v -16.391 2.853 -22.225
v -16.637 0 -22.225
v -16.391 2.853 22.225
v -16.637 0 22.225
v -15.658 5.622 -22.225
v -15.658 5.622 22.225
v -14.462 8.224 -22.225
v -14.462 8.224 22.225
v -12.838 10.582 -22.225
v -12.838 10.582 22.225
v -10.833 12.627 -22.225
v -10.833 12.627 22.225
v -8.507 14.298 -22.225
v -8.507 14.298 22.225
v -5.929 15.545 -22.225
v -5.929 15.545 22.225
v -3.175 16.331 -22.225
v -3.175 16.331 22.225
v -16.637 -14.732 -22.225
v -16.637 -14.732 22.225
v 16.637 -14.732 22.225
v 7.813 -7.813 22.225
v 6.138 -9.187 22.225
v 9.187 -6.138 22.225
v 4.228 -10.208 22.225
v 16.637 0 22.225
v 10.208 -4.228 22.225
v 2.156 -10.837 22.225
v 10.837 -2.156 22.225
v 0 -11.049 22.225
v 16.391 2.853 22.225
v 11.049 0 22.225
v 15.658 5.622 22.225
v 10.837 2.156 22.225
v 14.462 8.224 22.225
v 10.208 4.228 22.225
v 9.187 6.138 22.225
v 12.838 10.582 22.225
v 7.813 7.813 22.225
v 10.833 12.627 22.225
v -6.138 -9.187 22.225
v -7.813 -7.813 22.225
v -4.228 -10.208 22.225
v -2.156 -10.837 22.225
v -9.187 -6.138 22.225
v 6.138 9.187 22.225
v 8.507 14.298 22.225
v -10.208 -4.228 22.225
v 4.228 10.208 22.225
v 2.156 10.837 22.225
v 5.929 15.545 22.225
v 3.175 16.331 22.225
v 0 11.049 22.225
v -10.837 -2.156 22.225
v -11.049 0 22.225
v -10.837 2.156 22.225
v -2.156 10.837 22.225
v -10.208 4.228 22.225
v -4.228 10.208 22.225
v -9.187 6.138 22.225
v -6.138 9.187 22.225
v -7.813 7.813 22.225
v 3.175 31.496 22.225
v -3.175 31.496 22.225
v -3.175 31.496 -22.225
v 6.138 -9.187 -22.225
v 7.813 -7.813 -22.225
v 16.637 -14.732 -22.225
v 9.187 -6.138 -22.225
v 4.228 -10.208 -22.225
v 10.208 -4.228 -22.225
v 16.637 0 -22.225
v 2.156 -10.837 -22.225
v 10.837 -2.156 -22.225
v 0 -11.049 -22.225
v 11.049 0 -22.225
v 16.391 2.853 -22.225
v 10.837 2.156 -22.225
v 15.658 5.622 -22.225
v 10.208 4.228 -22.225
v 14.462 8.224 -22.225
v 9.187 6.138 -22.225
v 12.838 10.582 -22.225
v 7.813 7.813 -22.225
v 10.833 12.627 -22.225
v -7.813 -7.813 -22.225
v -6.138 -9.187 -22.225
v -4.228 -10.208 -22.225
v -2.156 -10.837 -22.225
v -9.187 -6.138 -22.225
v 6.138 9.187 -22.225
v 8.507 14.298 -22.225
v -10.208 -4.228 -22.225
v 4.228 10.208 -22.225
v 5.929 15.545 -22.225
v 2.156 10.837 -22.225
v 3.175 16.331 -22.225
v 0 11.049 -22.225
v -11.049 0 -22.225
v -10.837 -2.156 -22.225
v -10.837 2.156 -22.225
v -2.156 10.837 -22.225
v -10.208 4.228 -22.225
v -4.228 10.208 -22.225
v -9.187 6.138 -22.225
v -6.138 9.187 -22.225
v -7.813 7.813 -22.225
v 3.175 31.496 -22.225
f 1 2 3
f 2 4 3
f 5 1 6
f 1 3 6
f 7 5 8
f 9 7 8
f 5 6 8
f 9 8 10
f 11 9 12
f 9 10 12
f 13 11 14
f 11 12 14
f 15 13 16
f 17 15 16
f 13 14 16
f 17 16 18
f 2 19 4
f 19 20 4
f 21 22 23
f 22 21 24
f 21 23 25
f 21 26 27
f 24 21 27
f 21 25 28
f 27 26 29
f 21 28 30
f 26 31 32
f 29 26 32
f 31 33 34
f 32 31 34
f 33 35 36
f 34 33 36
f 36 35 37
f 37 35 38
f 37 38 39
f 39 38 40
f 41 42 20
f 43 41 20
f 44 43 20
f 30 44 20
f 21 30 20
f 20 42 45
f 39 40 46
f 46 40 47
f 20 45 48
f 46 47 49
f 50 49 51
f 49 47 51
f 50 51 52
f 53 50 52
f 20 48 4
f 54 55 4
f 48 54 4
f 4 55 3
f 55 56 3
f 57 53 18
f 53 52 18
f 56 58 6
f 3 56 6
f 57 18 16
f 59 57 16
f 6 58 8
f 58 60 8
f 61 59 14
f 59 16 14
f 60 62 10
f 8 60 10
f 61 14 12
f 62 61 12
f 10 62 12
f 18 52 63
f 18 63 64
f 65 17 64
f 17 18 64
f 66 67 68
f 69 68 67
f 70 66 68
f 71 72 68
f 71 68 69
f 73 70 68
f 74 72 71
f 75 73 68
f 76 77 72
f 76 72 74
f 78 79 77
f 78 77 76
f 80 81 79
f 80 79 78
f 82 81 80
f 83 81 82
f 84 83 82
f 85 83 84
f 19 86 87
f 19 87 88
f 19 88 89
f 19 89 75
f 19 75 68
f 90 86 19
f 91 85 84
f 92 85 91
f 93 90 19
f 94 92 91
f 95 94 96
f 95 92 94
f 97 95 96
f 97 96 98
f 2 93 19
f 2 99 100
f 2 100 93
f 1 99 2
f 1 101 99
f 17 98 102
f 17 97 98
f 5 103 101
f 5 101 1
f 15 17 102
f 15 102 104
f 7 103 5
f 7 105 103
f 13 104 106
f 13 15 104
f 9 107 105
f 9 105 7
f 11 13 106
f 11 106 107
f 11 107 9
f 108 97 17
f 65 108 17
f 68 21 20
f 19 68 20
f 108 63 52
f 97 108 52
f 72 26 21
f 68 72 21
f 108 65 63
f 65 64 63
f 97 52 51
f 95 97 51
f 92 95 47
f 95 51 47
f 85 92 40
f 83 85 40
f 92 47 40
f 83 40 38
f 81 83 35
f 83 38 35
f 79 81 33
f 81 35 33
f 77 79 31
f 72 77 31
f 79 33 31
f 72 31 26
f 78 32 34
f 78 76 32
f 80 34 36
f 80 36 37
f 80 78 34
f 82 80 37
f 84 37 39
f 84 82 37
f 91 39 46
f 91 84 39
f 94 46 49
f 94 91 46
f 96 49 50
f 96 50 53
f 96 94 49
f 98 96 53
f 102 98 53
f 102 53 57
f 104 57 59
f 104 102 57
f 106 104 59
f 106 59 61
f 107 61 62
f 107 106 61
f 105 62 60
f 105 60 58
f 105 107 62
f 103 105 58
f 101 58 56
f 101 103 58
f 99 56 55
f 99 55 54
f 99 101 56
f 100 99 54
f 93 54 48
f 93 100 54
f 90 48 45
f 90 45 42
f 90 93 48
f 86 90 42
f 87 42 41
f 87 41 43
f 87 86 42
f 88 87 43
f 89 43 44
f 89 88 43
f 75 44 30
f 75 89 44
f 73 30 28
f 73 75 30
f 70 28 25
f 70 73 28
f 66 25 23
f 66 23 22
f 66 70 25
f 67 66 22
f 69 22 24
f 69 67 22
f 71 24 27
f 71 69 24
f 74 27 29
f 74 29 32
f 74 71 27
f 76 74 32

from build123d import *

# Parameters (mm, degrees)
SKETCH1_R           = 11.049
BOSS_EXTRUDE1_DEPTH = 22.225


with BuildPart() as part:
    # Sketch1 → Boss-Extrude1 (new, symmetric)
    with BuildSketch(Plane.XY):
        with BuildLine():
            Line((16.637, -14.732), (-16.637, -14.732))
            Line((-16.637, -14.732), (-16.637, 0))
            ThreePointArc((-16.637, 0), (-12.83768367, 10.582232609), (-3.175, 16.331232164))
            Line((-3.175, 16.331232164), (-3.175, 31.496))
            Line((-3.175, 31.496), (3.175, 31.496))
            Line((3.175, 31.496), (3.175, 16.331232164))
            ThreePointArc((3.175, 16.331232164), (12.83768367, 10.582232609), (16.637, 0))
            Line((16.637, 0), (16.637, -14.732))
        make_face()
        Circle(SKETCH1_R, mode=Mode.SUBTRACT)
    extrude(amount=BOSS_EXTRUDE1_DEPTH, both=True)


solid = part.part
